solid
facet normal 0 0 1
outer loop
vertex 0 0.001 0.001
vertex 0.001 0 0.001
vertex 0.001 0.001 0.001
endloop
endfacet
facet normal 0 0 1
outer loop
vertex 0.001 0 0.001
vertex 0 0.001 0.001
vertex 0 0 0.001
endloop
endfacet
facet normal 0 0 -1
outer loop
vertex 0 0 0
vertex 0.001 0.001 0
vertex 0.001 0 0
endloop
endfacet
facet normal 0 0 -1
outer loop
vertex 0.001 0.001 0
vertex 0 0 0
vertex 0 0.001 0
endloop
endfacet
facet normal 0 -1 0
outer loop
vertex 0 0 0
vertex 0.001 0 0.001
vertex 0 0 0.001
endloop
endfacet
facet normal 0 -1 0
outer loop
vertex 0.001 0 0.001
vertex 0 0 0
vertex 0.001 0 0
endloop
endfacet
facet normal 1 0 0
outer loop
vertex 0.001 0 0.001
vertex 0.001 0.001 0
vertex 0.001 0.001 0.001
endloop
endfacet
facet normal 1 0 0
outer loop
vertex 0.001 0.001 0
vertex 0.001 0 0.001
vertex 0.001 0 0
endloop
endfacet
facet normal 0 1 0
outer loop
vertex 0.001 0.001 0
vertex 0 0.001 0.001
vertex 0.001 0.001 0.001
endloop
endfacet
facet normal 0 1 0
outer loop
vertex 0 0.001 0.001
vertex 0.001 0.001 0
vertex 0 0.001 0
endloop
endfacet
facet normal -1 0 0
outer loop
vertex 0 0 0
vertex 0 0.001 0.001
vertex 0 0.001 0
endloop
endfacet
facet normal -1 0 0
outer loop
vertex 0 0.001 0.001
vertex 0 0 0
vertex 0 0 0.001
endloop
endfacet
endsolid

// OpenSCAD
// file: ../src/frontend/ut_polyline.scad
// ut_polyline — the incumbent frontend: waypoints plus per-vertex fillet radii.
//
// The arithmetic is reference/axford/curvedPipe.scad:71-105 verbatim -- the one
// unambiguously correct piece of the old library (docs/salvage.md §1) -- plus
// the three guards it never had. Those guards are the whole point: each of the
// three inputs below used to produce WRONG GEOMETRY SILENTLY.

// clang-format off
use <../ut_core.scad>;
use <../ut_math.scad>;
use <../ut_path.scad>;
// clang-format on

// r may be a scalar (applied to interior vertices only), a list of len(pts)
// (indexed by vertex, ends ignored), or a list of len(pts)-2 (interior only --
// the legacy `radii` spelling).
function _ut_r_at(r, k, n) = is_num(r) ? r : len(r) == n ? r[k] : r[k - 1];

function ut_polyline(pts, r = 0, closed = false, frame = "transport", normal = undef,
                     twist = 0) = assert(len(pts) >= 2, "ut_polyline(): need at least 2 points")
    assert(is_num(r) || len(r) == len(pts) || len(r) == len(pts) - 2,
           str("ut_polyline(): r must be a scalar, or a list of ", len(pts), " or ", len(pts) - 2, " values"))
        assert(closed == false, "ut_polyline(): closed paths land in a later phase")
            let(n = len(pts), dirs = [for (i = [0:n - 2]) pts[i + 1] - pts[i]], lens = [for (d = dirs) norm(d)],
                // vertex-indexed; ends are 0
                angs = [for (k = [0:n - 1])(k == 0 || k == n - 1) ? 0 : _ut_defl(dirs[k - 1], dirs[k], k, pts)],
                insets = [for (k = [0:n - 1]) angs[k] < ut_eps() ? 0 : _ut_r_at(r, k, n) * tan(angs[k] / 2)],
                ok = _ut_fits(lens, insets, 0, pts, r))
                ut_spine([for (i = [0:n - 2]) each concat(_ut_leg(pts, dirs, lens, insets, i),
                                                          (i < n - 2 && angs[i + 1] >= ut_eps())
                                                              ? [_ut_bend(pts, dirs, insets, angs, i + 1, r, n)]
                                                              : [])],
                         false,
                         concat([ [ "frame", frame ], [ "twist", twist ] ],
                                is_undef(normal) ? [] : [[ "normal", normal ]]));

// GUARD 1 and 2 -- the deflection angle, with the two degeneracies that used to
// vanish silently. A 180 deg doubleback gives tan(90) = inf and [nan,nan,nan];
// a collinear waypoint with r>0 gives a NaN arc centre.
function _ut_defl(d1, d2, k, pts) = let(a = ut_turn(d1, d2))
    assert(a < 180 - 1e-6,
           str("ut_polyline(): 180 degree reversal at vertex ", k, " ", pts[k],
               " -- a path cannot double back on itself (tan(90) is inf, and the segment would silently vanish)")) a;

// GUARD 3 -- the overlap bug. Verified: the same path at radii [20,20] renders
// genus 1 and at [80,80] on a 100 mm leg renders GENUS 2 -- an extra through-hole
// -- with zero diagnostics, because OpenSCAD emits nothing for a non-positive
// extrusion height. ERROR, never "scale to fit": on a doubleback that rule
// scales the radius to exactly 0, which is itself NaN. See PLAN.md §9.5.
function _ut_fits(lens, insets, i, pts,
                  r) = i >= len(lens)
                           ? true
                           : let(need = insets[i] + insets[i + 1], have = lens[i])
                                 assert(have - need > -ut_eps(),
                                        str("ut_polyline(): fillet radii do not fit on the leg from ", pts[i], " to ",
                                            pts[i + 1], " -- leg is ", have, " mm but the two bends need ", need,
                                            " mm of tangent length (", insets[i], " + ", insets[i + 1],
                                            "). Reduce the radius at one of those vertices."))
                                     _ut_fits(lens, insets, i + 1, pts, r);

// The trimmed straight. Omitted entirely when two bends are exactly tangent.
function _ut_leg(pts, dirs, lens, insets, i) = let(u = ut_unit(dirs[i]), a = pts[i] + insets[i] * u,
                                                   b = pts[i + 1] - insets[i + 1] * u,
                                                   rem = lens[i] - insets[i] - insets[i + 1]) rem
                                                       > ut_eps()
                                                   ? [ut_line(a, b)]
                                                   : [];

// The arc at an interior vertex. The centre lies along the internal bisector at
// r / cos(ang/2) from the vertex; see docs/salvage.md §1 for the derivation.
function _ut_bend(pts, dirs, insets, angs, k, r,
                  n) = let(u1 = ut_unit(dirs[k - 1]), u2 = ut_unit(dirs[k]), ang = angs[k], rad = _ut_r_at(r, k, n),
                           tin = pts[k] - insets[k] * u1, axis = ut_unit(cross(dirs[k - 1], dirs[k])),
                           c = pts[k] + ut_unit(u2 - u1) * (rad / cos(ang / 2)), uu = ut_unit(tin - c),
                           vv = cross(axis, uu)) ut_arc(c, uu, vv, rad, ang);
// file: ../src/ut_port.scad
// ut_port — the termination seam, and nothing more (ADR 0005).
//
// uniTube ships this record and a placement module. It ships zero threads,
// barbs, clamps, sockets or grooves; those belong to a separate library that
// consumes only this file. THIS FILE HAS NO DEPENDENCIES ON PURPOSE -- a
// fittings library couples to a data format, not to a geometry engine.
//
//     port = ["utport", name, p, dir, n, profile, s]
//
//   dir  points OUTWARD, away from the material. Fixed once, here.
//   n    is the roll reference at that end -- the CLOCKING. A port carries a
//        full FRAME, not a position and a diameter, so a hex flat, keyway or
//        bayonet lug lands repeatably.

function ut_port(name, p, dir, n, profile, s) = [ "utport", name, p, dir, n, profile, s ];

function ut_port_name(p) = p[1];
function ut_port_pos(p) = p[2];
function ut_port_dir(p) = p[3];
function ut_port_normal(p) = p[4];
function ut_port_profile(p) = p[5];
function ut_port_s(p) = p[6];

// Place children at a port: +Z along the outward direction, +X along the roll
// reference, origin at the end plane. This is already the convention every
// create_*_part in reference/makrokaba/ emits into.
module ut_at_port(port)
{
    d = port[3];
    n = port[4];
    b = cross(d, n);
    p = port[2];
    multmatrix([[n [0], b [0], d [0], p [0]], [n [1], b [1], d [1], p [1]], [n [2], b [2], d [2], p [2]], [0, 0, 0, 1]])
        children();
}

// A debug marker: the outward direction as an arrow, plus the roll reference.
// This is how you verify the seam is right before any termination exists.
module ut_port_marker(port, len = 12)
{
    d = port[3];
    n = port[4];
    p = port[2];
    color("red") translate(p) linear_extrude(0.1) circle(1.2, $fn = 12);
    color("red") translate(p) _ut_arrow(d, len);
    color("blue") translate(p) _ut_arrow(n, len * 0.6);
}

module _ut_arrow(v, len)
{
    u = v / norm(v);
    hull()
    {
        sphere(0.4, $fn = 8);
        translate(u * len) sphere(0.4, $fn = 8);
    }
    translate(u * len) sphere(1.0, $fn = 12);
}
// file: ../src/ut_mesh.scad
// ut_mesh — THE BACKEND. A region swept along stations becomes ONE polyhedron.
//
// This is the whole of uniTube's geometry engine, and it is why the library has
// no dependencies (ADR 0001). Place each 2D loop point into each station frame,
// quad-strip the skins, close the ends, emit. No CSG anywhere along a run.
//
// Quads on a swept skin are generally NON-PLANAR. Every face emitted here is a
// TRIANGLE, so the topology is ours rather than something OpenSCAD guesses at
// ("PolySet has nonplanar faces. Attempting alternate construction").

// clang-format off
use <ut_core.scad>;
use <ut_math.scad>;
use <ut_path.scad>;
use <ut_profile.scad>;
use <ut_port.scad>;
use <ut_check.scad>;
// clang-format on

// Place a profile-local point into a station frame: p + x*n + y*b.
// +X is the station's roll-reference normal, +Y its binormal. That convention is
// what makes "the seam faces up" mean something.
function ut_place(st, q) = let(t = ut_st_t(st), n = ut_st_n(st), b = cross(t, n)) ut_st_p(st) + q[0] * n + q[1] * b;

function _ut_quad(a, b, c, d) = [[a, b, c], [a, c, d]];
function _ut_centroid(loop) = _ut_csum(loop, 0) / len(loop);
function _ut_csum(l, i) = i >= len(l) ? [ 0, 0 ] : l[i] + _ut_csum(l, i + 1);

// ---------------------------------------------------------------- vertices

// Annular (2 loops): per station, N outer points then N inner points.
// Solid (1 loop): per station, N points; plus one centroid vertex per open end.
function ut_mesh_points(rgn, sts, closed = false) =
    let(S = len(sts), N = len(rgn[0]), hollow = len(rgn) > 1) hollow
        ? [for (j = [0:S - 1])
                  each concat([for (q = rgn[0]) ut_place(sts[j], q)], [for (q = rgn[1]) ut_place(sts[j], q)])]
        : concat([for (j = [0:S - 1]) each[for (q = rgn[0]) ut_place(sts[j], q)]],
                 closed ? [] : [ ut_place(sts[0], _ut_centroid(rgn[0])), ut_place(sts[S - 1], _ut_centroid(rgn[0])) ]);

// ---------------------------------------------------------------- faces

function ut_mesh_faces(rgn, sts, closed = false, open = false) = let(S = len(sts), N = len(rgn[0]),
                                                                     hollow = len(rgn) > 1,
                                                                     last = closed ? S - 1 : S - 2) hollow
                                                                     ? _ut_faces_hollow(S, N, closed, last, open)
                                                                     : _ut_faces_solid(S, N, closed, last);

function _ut_oi(j, i, S, N) = (j % S) * 2 * N + (i % N);
function _ut_ii(j, i, S, N) = (j % S) * 2 * N + N + (i % N);
function _ut_vi(j, i, S, N) = (j % S) * N + (i % N);

function _ut_faces_hollow(S, N, closed, last, open = false) = let(iLast = open ? N - 2 : N - 1) concat(
    // outer skin
    [for (j = [0:last], i = [0:iLast]) each _ut_quad(_ut_oi(j, i, S, N), _ut_oi(j, i + 1, S, N),
                                                     _ut_oi(j + 1, i + 1, S, N), _ut_oi(j + 1, i, S, N))],
    // inner skin -- reversed, so it faces INTO the bore. This one line is where
    // the CCW/CCW storage convention is paid for (see ut_profile.scad header).
    [for (j = [0:last], i = [0:iLast]) each _ut_quad(_ut_ii(j, i, S, N), _ut_ii(j + 1, i, S, N),
                                                     _ut_ii(j + 1, i + 1, S, N), _ut_ii(j, i + 1, S, N))],
    // annular end caps -- a ring strip, NOT a polygon-with-holes triangulation.
    // This is what keeps the emitter short, and what PROF-2 exists to protect.
    closed ? []
           : concat([for (i = [0:iLast]) each _ut_quad(_ut_oi(0, i, S, N), _ut_ii(0, i, S, N), _ut_ii(0, i + 1, S, N),
                                                       _ut_oi(0, i + 1, S, N))],
                    [for (i = [0:iLast]) each _ut_quad(_ut_oi(S - 1, i, S, N), _ut_oi(S - 1, i + 1, S, N),
                                                       _ut_ii(S - 1, i + 1, S, N), _ut_ii(S - 1, i, S, N))]),
    // THE TWO SEAM WALLS of a C-section: the cut faces that close the split
    // along the whole run. Without them the surface is not closed and CGAL
    // rejects the mesh outright rather than reporting a plausible solid.
    !open ? []
          : concat([for (j = [0:last]) each _ut_quad(_ut_oi(j, 0, S, N), _ut_oi(j + 1, 0, S, N), _ut_ii(j + 1, 0, S, N),
                                                     _ut_ii(j, 0, S, N))],
                   [for (j = [0:last]) each _ut_quad(_ut_oi(j, N - 1, S, N), _ut_ii(j, N - 1, S, N),
                                                     _ut_ii(j + 1, N - 1, S, N), _ut_oi(j + 1, N - 1, S, N))]));

function _ut_faces_solid(S, N, closed, last) = let(C0 = S * N, C1 = S * N + 1)
    concat([for (j = [0:last], i = [0:N - 1]) each _ut_quad(_ut_vi(j, i, S, N), _ut_vi(j, i + 1, S, N),
                                                            _ut_vi(j + 1, i + 1, S, N), _ut_vi(j + 1, i, S, N))],
           closed ? []
                  : concat([for (i = [0:N - 1])[C0, _ut_vi(0, i + 1, S, N), _ut_vi(0, i, S, N)]],
                           [for (i = [0:N - 1])[C1, _ut_vi(S - 1, i, S, N), _ut_vi(S - 1, i + 1, S, N)]]));

// ---------------------------------------------------------------- emission

// Sweep a region along stations. ONE polyhedron, no CSG.
module ut_sweep(rgn, sts, closed = false, open = false)
{
    assert(len(rgn) > 0, "ut_sweep(): empty region -- a split profile has no bore to sweep");
    assert(len(sts) >= 2, "ut_sweep(): need at least 2 stations");
    polyhedron(points = ut_mesh_points(rgn, sts, closed), faces = ut_mesh_faces(rgn, sts, closed, open),
               convexity = 10);
}

// Sweep one run. `part` selects which region: the finished wall, the outer shell,
// or the bore as a positive solid. Assembly NEVER asks for "solid" (rule 5).
module ut_tube(path, prof, part = "solid", opts = [])
{
    assert(ut_check(path, prof));
    sts = ut_stations(path, opts);
    rgn = part == "solid" ? ut_solid_rgn(prof) : part == "shell" ? ut_shell_rgn(prof) : ut_bore_rgn(prof);
    assert(len(rgn) > 0, str("ut_tube(): part=\"", part, "\" is empty for this profile"));
    ut_sweep(rgn, sts, ut_closed(path), ut_prof_open(prof) && part == "solid");
}

// The mesh volume of a run, without rendering it. Used by tests/t_mesh.scad to
// catch the silent-material-loss class that CGAL's "Simple: yes" does not.
function ut_run_volume(path, prof, part = "solid", opts = []) = let(sts = ut_stations(path, opts),
                                                                    rgn = part == "solid"   ? ut_solid_rgn(prof)
                                                                          : part == "shell" ? ut_shell_rgn(prof)
                                                                                            : ut_bore_rgn(prof))
    ut_volume(ut_mesh_points(rgn, sts, ut_closed(path)),
              ut_mesh_faces(rgn, sts, ut_closed(path), ut_prof_open(prof) && part == "solid"));

// The two open ends of a single run. Phase 3 moves this to ut_net.scad, where
// ports are derived from GRAPH DEGREE and a joint-incident end is not a port.
// `dir` points OUTWARD: away from the material at each end.
function ut_run_ports(path, prof, name = "run", opts = []) =
    let(sts = ut_stations(path, opts),
        N = len(sts))[ut_port(str(name, ".a"), ut_st_p(sts[0]), -ut_st_t(sts[0]), ut_st_n(sts[0]), prof, 0),
                      ut_port(str(name, ".b"), ut_st_p(sts[N - 1]), ut_st_t(sts[N - 1]), ut_st_n(sts[N - 1]), prof,
                              ut_st_s(sts[N - 1]))];
// file: ../src/ut_check.scad
// ut_check — analytic validation, because CGAL is a weak oracle.
//
// Every check here runs on the IR as PURE DATA. Nothing is rendered, nothing is
// tessellated, and the answer does not depend on $fa/$fs.
//
// This exists because "Simple: yes" is necessary and nowhere near sufficient.
// Measured on this machine: an od=12 tube swept through an r=4 bend passes
// THROUGH ITSELF at the bend, and CGAL still reports `Simple: yes, Volumes: 2`
// with a plausible positive volume and zero warnings. No amount of rendering
// finds that; only arithmetic on the spine does.

// clang-format off
use <ut_core.scad>;
use <ut_math.scad>;
use <ut_path.scad>;
use <ut_profile.scad>;
// clang-format on

// The outer extremity of the profile, measured from the centreline. For a round
// section that is od/2; for an arbitrary one it is the farthest vertex.
function ut_prof_reach(prof) = max([for (q = ut_prof_outer(prof)) norm(q)]);

// CHECK-1 — a bend radius must exceed the profile's outer reach, strictly.
// At r == reach the inner extremity of the swept surface collapses onto the bend
// axis; below it, the tube passes through itself.
function _ut_chk_bends(segs, i, reach, od) =
    i >= len(segs) ? true
    : (ut_seg_kind(segs[i]) != "A")
        ? _ut_chk_bends(segs, i + 1, reach, od)
        : let(r = segs[i][4])
              assert(r > reach + ut_eps(),
                     str("CHECK-1: bend radius ", r, " is not greater than the profile's outer reach ", reach,
                         " -- the tube passes through itself at this bend. CGAL will still report \"Simple: yes\"."))
                  _ut_chk_bends(segs, i + 1, reach, od);

// CHECK-2 — a bend tighter than one full diameter is legal but ugly and hard to
// print. A warning, never an error.
function _ut_warn_tight(segs, i, od) = i >= len(segs) ? true
                                       : (ut_seg_kind(segs[i]) == "A" && segs[i][4] < od)
                                           ? echo(str("WARNING [uniTube] CHECK-2: bend radius ", segs[i][4],
                                                      " is less than one full od (", od,
                                                      ") -- legal, but tight to print")) _ut_warn_tight(segs, i + 1, od)
                                           : _ut_warn_tight(segs, i + 1, od);

// CHECK-3 — PROF-3 restated at run level: a wall below the minimum renders
// perfectly and prints as a hole.
function _ut_warn_wall(prof) = !ut_prof_thin(prof)
                                   ? true
                                   : echo(str("WARNING [uniTube] CHECK-3: wall ", ut_prof_wall(prof),
                                              " mm is below the ", ut_min_wall(),
                                              " mm minimum -- this may render perfectly and print as a hole")) true;

// Validate a run. Returns true so it can prefix an expression or sit in an
// assert. ut_tube() calls this on every render.
function ut_check(path, prof) = let(segs = ut_segs(path), reach = ut_prof_reach(prof), od = ut_prof_od(prof))
                                    _ut_chk_bends(segs, 0, reach, is_undef(od) ? 2 * reach : od) &&
                                _ut_warn_tight(segs, 0, is_undef(od) ? 2 * reach : od) && _ut_warn_wall(prof);
// file: ../src/ut_profile.scad
// ut_profile — the cross-section, and the lumen that must survive every union.
//
//     prof = ["utprof", outer, inner, meta]
//
// A "region" here is a list of closed loops: the first is the outer boundary,
// any others are holes. Three regions are derivable from one profile, and the
// entire junction story depends on being able to ask for each independently:
//
//     ut_solid_rgn  [outer, inner]   the finished wall  -> ONE capped polyhedron
//     ut_shell_rgn  [outer]          outer filled, bore ignored
//     ut_bore_rgn   [inner]          the lumen AS A POSITIVE SOLID
//
// NO MODULE EVER EMITS A FINISHED HOLLOW TUBE DURING ASSEMBLY (AGENTS.md rule 5).
//
// WINDING CONVENTION — deviates from PLAN.md §3 deliberately. Both loops are
// stored COUNTER-CLOCKWISE, not outer-CCW/inner-CW. Reversing the inner loop
// would destroy the index correspondence that PROF-2 requires, and the bore
// would no longer be a directly usable positive solid. The mesh emitter orients
// the inner skin's faces instead -- one line, in one place. See ADR 0006.

// clang-format off
use <ut_core.scad>;
use <ut_math.scad>;
// clang-format on

// =============================================================== constructors

// Exactly two of {od, id, wall}. Supplying one or three is an error naming what
// was given -- all three spellings describe the same profile.
function ut_round(od = undef, id = undef, wall = undef, n = undef, a0 = 0,
                  split = undef) = let(given = (is_undef(od) ? 0 : 1) + (is_undef(id) ? 0 : 1) +
                                               (is_undef(wall) ? 0 : 1))
    assert(given == 2,
           str("ut_round(): give exactly two of od/id/wall, got ", given, " (od=", od, " id=", id, " wall=", wall, ")"))
        let(OD = is_undef(od) ? id + 2 * wall : od, ID = is_undef(id) ? od - 2 * wall : id,
            W = is_undef(wall) ? (od - id) / 2 : wall)
            assert(OD > 0 && ID >= 0 && W > 0,
                   str("ut_round(): implied dimensions must be positive (od=", OD, " id=", ID, " wall=", W, ")"))
                assert(ID < OD, str("ut_round(): id (", ID, ") must be less than od (", OD,
                                    ")"))(is_undef(split) ? _ut_round_closed(OD, ID, W, n, a0)
                                                          : _ut_round_split(OD, ID, W, n, split));

function _ut_round_closed(OD, ID, W, n, a0) = let(N = is_undef(n) ? ut_fragments(OD / 2, 360) : n)
    ut_profile(ut_ring(OD / 2, N, a0), ut_ring(ID / 2, N, a0),
               [ [ "od", OD ], [ "id", ID ], [ "wall", W ], [ "symmetry", 0 ], [ "kind", "round" ] ]);

// A C-SECTION. `split` is the angular GAP in profile-local degrees, so material
// spans split[1] .. split[0]+360. Local +X is the station roll reference, which
// is what makes "the seam faces up" mean something.
//
// A split tube is a PROFILE, not a path feature. That is the strongest single
// piece of evidence that path/profile is the right cut, and it replaces roughly
// 300 lines of reference/axford/half_curvedPipe.scad -- including its hard
// nine-segment ceiling -- with a constructor and a policy string.
function _ut_round_split(OD, ID, W, n, split) = assert(is_list(split) && len(split) == 2,
                                                       "ut_round(): split must be [gap_start, gap_end] in degrees")
    let(span = (split[0] + 360) - split[1])
        assert(span > ut_eps() && span < 360 - ut_eps(),
               str("ut_round(): the split gap leaves a material span of ", span, " degrees; it must be in (0, 360)"))
            let(N = is_undef(n) ? ut_fragments(OD / 2, span) + 1 : n,
                angs = [for (k = [0:N - 1]) split[1] + span * k / (N - 1)])
                ut_profile([for (a = angs)[OD / 2 * cos(a), OD / 2 * sin(a)]],
                           [for (a = angs)[ID / 2 * cos(a), ID / 2 * sin(a)]], [
                               [ "od", OD ], [ "id", ID ], [ "wall", W ], [ "symmetry", 1 ], [ "kind", "split" ],
                               [ "open", true ], [ "split", split ]
                           ]);

// A solid rod -- no lumen. Its end caps are triangulated by a centroid fan, so
// the outline must be star-shaped about its centroid (true for any convex shape).
function ut_rod(d, n = undef, a0 = 0) = let(N = is_undef(n) ? ut_fragments(d / 2, 360) : n)
    ut_profile(ut_ring(d / 2, N, a0), undef, [ [ "od", d ], [ "symmetry", 0 ], [ "kind", "rod" ] ]);

// An arbitrary hollow section. Asserts the profile invariants.
function ut_profile(outer, inner = undef, meta = []) = assert(len(outer) >= 3,
                                                              "ut_profile(): outer loop needs at least 3 points")
    assert(ut_area2d(outer) > 0, "PROF-1: outer loop must be counter-clockwise (positive signed area)") assert(
        is_undef(inner) || len(inner) == len(outer),
        str("PROF-2: outer and inner loops must have the SAME point count (got ", len(outer), " and ",
            is_undef(inner) ? 0 : len(inner), ") -- see ADR 0006"))
        assert(is_undef(inner) || ut_area2d(inner) > 0,
               "PROF-1: inner loop must also be counter-clockwise -- the emitter orients it, not the profile")
            assert(
                is_undef(inner) || _ut_aligned(outer, inner),
                "PROF-2: outer and inner loops must be ANGLE-ALIGNED index-for-index. Sampling a bore by perimeter instead of by angle self-intersects the end caps, and CGAL reports only an assertion violation. See ADR 0006.")
                ["utprof", outer, inner, meta];

// PROF-2 correspondence: outer[i] and inner[i] must sit at the same polar angle.
function _ut_aligned(o, i) = max([for (k = [0:len(o) - 1])
                                     abs(_ut_dang(atan2(o[k][1], o[k][0]), atan2(i[k][1], i[k][0])))]) < 1e-6;
function _ut_dang(a, b) = let(d = a - b) d - round(d / 360) * 360;

// =============================================================== accessors

function ut_prof_outer(p) = p[1];
function ut_prof_inner(p) = p[2];
function ut_prof_meta(p) = p[3];
function ut_prof_od(p) = ut_opt(ut_prof_meta(p), "od");
function ut_prof_id(p) = ut_opt(ut_prof_meta(p), "id");
function ut_prof_wall(p) = ut_opt(ut_prof_meta(p), "wall");
function ut_prof_symmetry(p) = ut_opt(ut_prof_meta(p), "symmetry", 0);
function ut_prof_hollow(p) = !is_undef(ut_prof_inner(p));
// An OPEN section (a C-section) has an inner surface but no ENCLOSED lumen, so
// it cannot participate in a junction. Documented rather than discovered.
function ut_prof_open(p) = ut_opt(ut_prof_meta(p), "open", false);

// =============================================================== regions

function ut_solid_rgn(p) = ut_prof_hollow(p) ? [ ut_prof_outer(p), ut_prof_inner(p) ] : [ut_prof_outer(p)];

// shell and bore are only meaningful for a CLOSED section. A split run has no
// enclosed lumen, contributes nothing to the subtraction pass, and therefore
// cannot join to anything -- fine for conduit and cable channel, which is what
// C-sections are for.
function ut_shell_rgn(p) = ut_prof_open(p) ? [] : [ut_prof_outer(p)];
function ut_bore_rgn(p) = (ut_prof_open(p) || !ut_prof_hollow(p)) ? [] : [ut_prof_inner(p)];

// PROF-3 — a wall below the minimum is a WARNING, not an error: a tube that
// renders perfectly and prints as a hole is the failure this library prevents.
function ut_prof_thin(p) = let(w = ut_prof_wall(p)) !is_undef(w) && w < ut_min_wall();
// file: ../src/ut_math.scad
// ut_math — the ~25 lines that replace 1035 lines of vendored maths.scad and
// vector.scad. See docs/salvage.md §5.

// clang-format off
use <ut_core.scad>;
// clang-format on

function ut_unit(v) = v / norm(v);

// The angle between two 3D vectors, in degrees, ALWAYS via atan2.
// 3D only: cross() requires 3-vectors. For planar angles use atan2(y, x).
// NEVER acos: acos(1.0000001) is nan on OpenSCAD 2021.01 and near-collinear
// waypoints are the most common input there is. See AGENTS.md rule 7.
function ut_turn(a, b) = atan2(norm(cross(a, b)), a *b);

// Rodrigues' rotation of v about unit axis k by ang degrees.
// This is reference/axford/half_curvedPipe.scad:19, generalised. docs/salvage.md §2.
function ut_rotv(v, ang, k) = v * cos(ang) + cross(k, v) * sin(ang) + k * (k * v) * (1 - cos(ang));

// Project ref orthogonal to t and normalise -- the roll-reference seed.
// Falls back from UP to BACK when the run starts parallel to ref, which is the
// vertical-tangent NaN that has killed every previous attempt at this.
function ut_ref_fallback(t, ref = undef) = let(r0 = is_undef(ref) ? ut_up() : ref, tu = ut_unit(t),
                                               r = norm(cross(tu, r0)) < 1e-6
                                                       ? (norm(cross(tu, ut_back())) < 1e-6 ? [ 1, 0, 0 ] : ut_back())
                                                       : r0) ut_unit(r - tu * (r * tu));

// Re-orthogonalise n against t, preserving n's direction as closely as possible.
function ut_ortho(t, n) = let(tu = ut_unit(t), p = n - tu * (n * tu)) ut_unit(p);

// OpenSCAD's own $fn/$fa/$fs rule, applied per-radius and scaled to a partial
// sweep. This is why an arc-native IR gives better meshes than a sampled one:
// each bend gets facets from ITS OWN radius.
function ut_fragments(r, ang = 360) = let(full = $fn > 0 ? max($fn, 3) : ceil(max(min(360 / $fa, r * 2 * PI / $fs), 5)))
    max(2, ceil(full *abs(ang) / 360));

// A closed CCW polygon of n points on a circle of radius r, sampled by ANGLE.
// Angle-sampling is what makes two loops correspondence-aligned (PROF-2 /
// ADR 0006); sampling by arclength does not, and self-intersects the end caps.
function ut_ring(r, n, a0 = 0) = [for (i = [0:n - 1]) let(a = a0 + 360 * i / n)[r * cos(a), r *sin(a)]];

// Signed area of a 2D polygon. Positive = counter-clockwise.
function ut_area2d(poly) = let(n = len(poly)) 0.5 * _ut_area_sum(poly, n, 0);
function _ut_area_sum(p, n, i) = i >= n ? 0
                                        : (p[i][0] * p[(i + 1) % n][1] - p[(i + 1) % n][0] * p[i][1]) +
                                              _ut_area_sum(p, n, i + 1);

// Volume of a closed triangulated mesh by the divergence theorem.
// Replaces BOSL2's vnf_volume(). Verified exact to 6 s.f. against analytic
// values in Phase 0 -- see ADR 0001.
function ut_volume(pts, faces) = _ut_vol(pts, faces, 0);
function _ut_vol(P, F, i) = i >= len(F) ? 0 : _ut_face_vol(P, F[i]) + _ut_vol(P, F, i + 1);
function _ut_face_vol(P, f) = _ut_fan(P, f, 1);
function _ut_fan(P, f, k) = k > len(f) - 2 ? 0 : (P[f[0]] * cross(P[f[k]], P[f[k + 1]])) / 6 + _ut_fan(P, f, k + 1);
// file: ../src/ut_core.scad
// ut_core — shared constants, record access, and assertion helpers.
//
// NOTE: OpenSCAD's `use <>` re-exports functions and modules transitively but
// NOT top-level variables (verified on 2021.01). Every shared constant in this
// library is therefore a zero-argument FUNCTION, not a variable.

function ut_eps() = 1e-9;
function ut_min_wall() = 1.2; // ~3 perimeters on a 0.4 nozzle; a warning, not an error

function ut_up() = [ 0, 0, 1 ];
function ut_back() = [ 0, 1, 0 ];

// --- association lists: opts = [["key", value], ...] --------------------------
function ut_opt(opts, key, dflt = undef) = let(hit = [for (e = opts) if (e[0] == key) e[1]]) len(hit) > 0 ? hit[0]
                                                                                                          : dflt;

function ut_has_opt(opts, key) = len([for (e = opts) if (e[0] == key) 1]) > 0;

// --- tagged records -----------------------------------------------------------
// Every record is ["tag", ...fields]. User code reads them through accessors,
// never by index, so a field can be added without invalidating existing values.
function ut_tag(rec) = is_list(rec) ? rec[0] : undef;
function ut_is(rec, tag) = ut_tag(rec) == tag;

// --- assertion helper ---------------------------------------------------------
// Usage: function f(x) = ut_req(x > 0, str("f(): x must be positive, got ", x)) x * 2;
// Returns true when the condition holds so it can prefix an expression.
function ut_req(cond, msg) = assert(cond, msg) true;
// file: ../src/uniTube.scad
// uniTube — The Universal Tube Library for OpenSCAD
//
// The only public entry point:
//     use <uniTube/src/uniTube.scad>;
//
// NOTE ON `include` vs `use`, verified on OpenSCAD 2021.01:
//   * `use` does NOT transitively re-export. A consumer doing `use <A>` where A
//     does `use <B>` CANNOT see B's functions.
//   * `include` merges a file into this one's scope, and `use` then exports what
//     it finds there. So the entry point must `include`, not `use`.
//   * Relative paths resolve against the file containing the directive, so
//     frontend/'s `../` imports still work when included from here.
// Internal modules use `use <>` for their own dependencies; only this file
// includes. Nothing in src/ emits geometry or echoes on import (AGENTS.md rule 3).

// clang-format off
include <ut_core.scad>;
include <ut_math.scad>;
include <ut_path.scad>;
include <ut_profile.scad>;
include <ut_check.scad>;
include <ut_mesh.scad>;
include <ut_port.scad>;
include <frontend/ut_polyline.scad>;
// clang-format on
// main file
// t_check — the positive side of the analytic guards. The negative side lives in
// tests/guards/, since an assert that fires cannot be caught from inside OpenSCAD.

// clang-format off
use <../src/uniTube.scad>;
// clang-format on

prof = ut_round(od = 12, wall = 2);
assert(abs(ut_prof_reach(prof) - 6) < 1e-9, "a round profile reaches od/2 from the centreline");

// Reach is a property of the OUTLINE, not of od -- an arbitrary section is
// measured, not assumed.
sq = ut_profile(ut_ring(6, 32), ut_ring(4, 32), [[ "od", 12 ]]);
assert(abs(ut_prof_reach(sq) - 6) < 1e-6, "reach measures the farthest vertex");

// CHECK-1 passes comfortably here: r=15 against a reach of 6.
ok = ut_polyline([ [ 0, 0, 0 ], [ 50, 0, 0 ], [ 50, 50, 0 ] ], r = 15);
assert(ut_check(ok, prof), "a well-proportioned bend passes");

// The boundary: r must be STRICTLY greater than the reach. r = 6.0001 passes,
// r = 4 aborts (tests/guards/g_check_bend.scad). At r == reach the inner
// extremity of the swept surface collapses onto the bend axis.
edge = ut_polyline([ [ 0, 0, 0 ], [ 50, 0, 0 ], [ 50, 50, 0 ] ], r = 6.0001);
assert(ut_check(edge, prof), "just above the reach is legal");

// A straight run has no arcs, so CHECK-1 has nothing to say.
assert(ut_check(ut_polyline([ [ 0, 0, 0 ], [ 30, 0, 0 ] ]), prof), "a straight run always passes");

cube(0.001); // sentinel
